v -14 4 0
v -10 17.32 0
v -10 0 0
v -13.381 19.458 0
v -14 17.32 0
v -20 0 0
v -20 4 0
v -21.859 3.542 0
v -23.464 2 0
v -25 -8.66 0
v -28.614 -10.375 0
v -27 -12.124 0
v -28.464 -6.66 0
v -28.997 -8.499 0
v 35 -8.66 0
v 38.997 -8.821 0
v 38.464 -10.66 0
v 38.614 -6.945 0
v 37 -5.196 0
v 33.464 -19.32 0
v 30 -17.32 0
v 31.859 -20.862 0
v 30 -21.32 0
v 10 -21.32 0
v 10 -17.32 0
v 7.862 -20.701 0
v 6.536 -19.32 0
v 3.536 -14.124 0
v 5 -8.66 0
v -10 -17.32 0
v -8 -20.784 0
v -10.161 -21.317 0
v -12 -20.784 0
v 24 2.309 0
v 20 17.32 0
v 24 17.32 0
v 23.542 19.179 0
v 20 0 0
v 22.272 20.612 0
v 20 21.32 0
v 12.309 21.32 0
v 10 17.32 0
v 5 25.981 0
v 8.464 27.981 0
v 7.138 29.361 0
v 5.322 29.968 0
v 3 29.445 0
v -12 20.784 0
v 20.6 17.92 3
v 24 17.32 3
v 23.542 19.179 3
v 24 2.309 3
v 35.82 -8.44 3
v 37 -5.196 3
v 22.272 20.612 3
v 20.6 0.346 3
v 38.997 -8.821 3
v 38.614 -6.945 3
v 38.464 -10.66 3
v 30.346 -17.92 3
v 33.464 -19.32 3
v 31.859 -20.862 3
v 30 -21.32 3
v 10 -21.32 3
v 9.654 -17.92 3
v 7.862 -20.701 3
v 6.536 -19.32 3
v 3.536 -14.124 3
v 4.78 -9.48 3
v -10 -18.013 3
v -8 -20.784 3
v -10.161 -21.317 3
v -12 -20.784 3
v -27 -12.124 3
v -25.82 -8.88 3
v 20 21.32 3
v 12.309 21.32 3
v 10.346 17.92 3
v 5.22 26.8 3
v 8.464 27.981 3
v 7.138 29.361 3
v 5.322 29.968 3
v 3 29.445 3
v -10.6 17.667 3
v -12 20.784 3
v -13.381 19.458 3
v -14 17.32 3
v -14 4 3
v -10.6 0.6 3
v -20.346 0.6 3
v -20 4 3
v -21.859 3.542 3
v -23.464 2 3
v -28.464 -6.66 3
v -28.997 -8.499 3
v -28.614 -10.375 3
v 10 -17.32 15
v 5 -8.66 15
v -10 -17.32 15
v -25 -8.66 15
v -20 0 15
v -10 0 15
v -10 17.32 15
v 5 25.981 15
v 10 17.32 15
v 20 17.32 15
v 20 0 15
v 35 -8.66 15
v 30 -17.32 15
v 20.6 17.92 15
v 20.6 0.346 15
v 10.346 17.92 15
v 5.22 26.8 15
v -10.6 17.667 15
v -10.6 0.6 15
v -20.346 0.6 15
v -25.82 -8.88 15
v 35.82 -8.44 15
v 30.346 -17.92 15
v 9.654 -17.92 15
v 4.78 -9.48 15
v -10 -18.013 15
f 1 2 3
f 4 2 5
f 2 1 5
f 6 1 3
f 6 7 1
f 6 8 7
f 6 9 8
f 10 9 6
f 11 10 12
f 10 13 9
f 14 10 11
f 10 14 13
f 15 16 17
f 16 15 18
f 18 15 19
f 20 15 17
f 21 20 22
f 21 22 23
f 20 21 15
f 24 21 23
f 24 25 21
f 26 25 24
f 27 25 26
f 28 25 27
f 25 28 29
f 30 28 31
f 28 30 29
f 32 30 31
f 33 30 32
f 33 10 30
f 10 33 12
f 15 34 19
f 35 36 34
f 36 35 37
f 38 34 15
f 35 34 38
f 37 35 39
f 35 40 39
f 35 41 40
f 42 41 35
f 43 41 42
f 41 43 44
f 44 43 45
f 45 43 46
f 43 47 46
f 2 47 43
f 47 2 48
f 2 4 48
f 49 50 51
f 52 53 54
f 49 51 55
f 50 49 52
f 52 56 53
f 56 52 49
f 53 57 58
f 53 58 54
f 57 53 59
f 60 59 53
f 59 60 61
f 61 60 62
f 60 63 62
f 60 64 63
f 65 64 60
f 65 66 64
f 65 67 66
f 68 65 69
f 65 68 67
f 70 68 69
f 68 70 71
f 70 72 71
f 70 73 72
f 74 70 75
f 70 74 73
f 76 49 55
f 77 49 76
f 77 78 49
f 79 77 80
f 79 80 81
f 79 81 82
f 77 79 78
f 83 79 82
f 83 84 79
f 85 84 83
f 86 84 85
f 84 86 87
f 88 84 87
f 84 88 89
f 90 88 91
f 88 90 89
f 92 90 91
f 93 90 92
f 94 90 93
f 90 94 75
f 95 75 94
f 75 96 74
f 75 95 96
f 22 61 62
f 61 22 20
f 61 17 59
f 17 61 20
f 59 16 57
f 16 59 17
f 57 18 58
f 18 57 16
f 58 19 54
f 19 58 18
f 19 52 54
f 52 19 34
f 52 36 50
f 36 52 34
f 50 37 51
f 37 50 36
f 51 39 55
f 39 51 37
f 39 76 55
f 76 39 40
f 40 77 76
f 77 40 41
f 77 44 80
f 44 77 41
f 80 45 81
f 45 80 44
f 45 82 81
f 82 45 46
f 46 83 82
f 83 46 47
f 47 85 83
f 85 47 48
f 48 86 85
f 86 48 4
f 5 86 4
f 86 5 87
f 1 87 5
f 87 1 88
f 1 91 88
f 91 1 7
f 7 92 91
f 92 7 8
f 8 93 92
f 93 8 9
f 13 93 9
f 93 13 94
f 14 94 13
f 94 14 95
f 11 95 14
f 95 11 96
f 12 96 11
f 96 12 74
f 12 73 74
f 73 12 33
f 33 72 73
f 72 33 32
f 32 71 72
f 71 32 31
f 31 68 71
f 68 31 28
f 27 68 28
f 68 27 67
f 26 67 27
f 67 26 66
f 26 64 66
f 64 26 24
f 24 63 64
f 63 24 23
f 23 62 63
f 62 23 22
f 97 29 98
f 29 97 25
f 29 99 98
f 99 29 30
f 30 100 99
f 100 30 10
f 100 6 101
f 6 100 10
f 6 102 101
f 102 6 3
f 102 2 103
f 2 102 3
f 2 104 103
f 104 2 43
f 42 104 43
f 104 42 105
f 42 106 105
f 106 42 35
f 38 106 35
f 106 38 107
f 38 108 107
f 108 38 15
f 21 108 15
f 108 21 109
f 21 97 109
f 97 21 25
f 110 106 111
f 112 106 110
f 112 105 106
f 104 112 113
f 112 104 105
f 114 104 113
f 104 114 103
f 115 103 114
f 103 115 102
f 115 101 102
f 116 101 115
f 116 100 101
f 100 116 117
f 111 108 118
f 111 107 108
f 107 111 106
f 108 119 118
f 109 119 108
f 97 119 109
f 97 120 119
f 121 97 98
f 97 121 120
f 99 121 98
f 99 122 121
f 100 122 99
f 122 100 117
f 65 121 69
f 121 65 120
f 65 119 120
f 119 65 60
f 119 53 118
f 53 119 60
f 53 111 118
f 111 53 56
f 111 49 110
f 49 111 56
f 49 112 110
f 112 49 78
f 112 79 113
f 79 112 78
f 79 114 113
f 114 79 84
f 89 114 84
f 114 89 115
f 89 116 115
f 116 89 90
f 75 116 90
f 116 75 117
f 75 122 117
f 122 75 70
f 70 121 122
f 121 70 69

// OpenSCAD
r = [1,0];
u = [cos(60),sin(60)];
d = [cos(60),-sin(60)];
scale = 20;
rim = 4;
rim_height = 3;
wall = 0.6;
height = 15;

points = [
    [0,0],
    1/2 * r,
    u,
    2*u + 1/2*d,
    r + u,
    u + 3/2*r,
    2*r,
    3*r - 1/2*u,
    2*r + d,
    r + d,
    r + 1/2 * d,
    d,
    -1/2 * u
 ];
 
 module cookie_cutter() {
    linear_extrude(rim_height) {
        difference() {
            offset(r = rim) {
                scale(scale) translate(-r) polygon(points);
            }
            scale(scale) translate(-r) polygon(points);
        }
    }
    
    
    linear_extrude(height) {
        difference() {
            offset(delta = wall) {
                scale(scale) translate(-r) polygon(points);
            }
            scale(scale) translate(-r) polygon(points);
        }
    }
 }
 
 cookie_cutter();
